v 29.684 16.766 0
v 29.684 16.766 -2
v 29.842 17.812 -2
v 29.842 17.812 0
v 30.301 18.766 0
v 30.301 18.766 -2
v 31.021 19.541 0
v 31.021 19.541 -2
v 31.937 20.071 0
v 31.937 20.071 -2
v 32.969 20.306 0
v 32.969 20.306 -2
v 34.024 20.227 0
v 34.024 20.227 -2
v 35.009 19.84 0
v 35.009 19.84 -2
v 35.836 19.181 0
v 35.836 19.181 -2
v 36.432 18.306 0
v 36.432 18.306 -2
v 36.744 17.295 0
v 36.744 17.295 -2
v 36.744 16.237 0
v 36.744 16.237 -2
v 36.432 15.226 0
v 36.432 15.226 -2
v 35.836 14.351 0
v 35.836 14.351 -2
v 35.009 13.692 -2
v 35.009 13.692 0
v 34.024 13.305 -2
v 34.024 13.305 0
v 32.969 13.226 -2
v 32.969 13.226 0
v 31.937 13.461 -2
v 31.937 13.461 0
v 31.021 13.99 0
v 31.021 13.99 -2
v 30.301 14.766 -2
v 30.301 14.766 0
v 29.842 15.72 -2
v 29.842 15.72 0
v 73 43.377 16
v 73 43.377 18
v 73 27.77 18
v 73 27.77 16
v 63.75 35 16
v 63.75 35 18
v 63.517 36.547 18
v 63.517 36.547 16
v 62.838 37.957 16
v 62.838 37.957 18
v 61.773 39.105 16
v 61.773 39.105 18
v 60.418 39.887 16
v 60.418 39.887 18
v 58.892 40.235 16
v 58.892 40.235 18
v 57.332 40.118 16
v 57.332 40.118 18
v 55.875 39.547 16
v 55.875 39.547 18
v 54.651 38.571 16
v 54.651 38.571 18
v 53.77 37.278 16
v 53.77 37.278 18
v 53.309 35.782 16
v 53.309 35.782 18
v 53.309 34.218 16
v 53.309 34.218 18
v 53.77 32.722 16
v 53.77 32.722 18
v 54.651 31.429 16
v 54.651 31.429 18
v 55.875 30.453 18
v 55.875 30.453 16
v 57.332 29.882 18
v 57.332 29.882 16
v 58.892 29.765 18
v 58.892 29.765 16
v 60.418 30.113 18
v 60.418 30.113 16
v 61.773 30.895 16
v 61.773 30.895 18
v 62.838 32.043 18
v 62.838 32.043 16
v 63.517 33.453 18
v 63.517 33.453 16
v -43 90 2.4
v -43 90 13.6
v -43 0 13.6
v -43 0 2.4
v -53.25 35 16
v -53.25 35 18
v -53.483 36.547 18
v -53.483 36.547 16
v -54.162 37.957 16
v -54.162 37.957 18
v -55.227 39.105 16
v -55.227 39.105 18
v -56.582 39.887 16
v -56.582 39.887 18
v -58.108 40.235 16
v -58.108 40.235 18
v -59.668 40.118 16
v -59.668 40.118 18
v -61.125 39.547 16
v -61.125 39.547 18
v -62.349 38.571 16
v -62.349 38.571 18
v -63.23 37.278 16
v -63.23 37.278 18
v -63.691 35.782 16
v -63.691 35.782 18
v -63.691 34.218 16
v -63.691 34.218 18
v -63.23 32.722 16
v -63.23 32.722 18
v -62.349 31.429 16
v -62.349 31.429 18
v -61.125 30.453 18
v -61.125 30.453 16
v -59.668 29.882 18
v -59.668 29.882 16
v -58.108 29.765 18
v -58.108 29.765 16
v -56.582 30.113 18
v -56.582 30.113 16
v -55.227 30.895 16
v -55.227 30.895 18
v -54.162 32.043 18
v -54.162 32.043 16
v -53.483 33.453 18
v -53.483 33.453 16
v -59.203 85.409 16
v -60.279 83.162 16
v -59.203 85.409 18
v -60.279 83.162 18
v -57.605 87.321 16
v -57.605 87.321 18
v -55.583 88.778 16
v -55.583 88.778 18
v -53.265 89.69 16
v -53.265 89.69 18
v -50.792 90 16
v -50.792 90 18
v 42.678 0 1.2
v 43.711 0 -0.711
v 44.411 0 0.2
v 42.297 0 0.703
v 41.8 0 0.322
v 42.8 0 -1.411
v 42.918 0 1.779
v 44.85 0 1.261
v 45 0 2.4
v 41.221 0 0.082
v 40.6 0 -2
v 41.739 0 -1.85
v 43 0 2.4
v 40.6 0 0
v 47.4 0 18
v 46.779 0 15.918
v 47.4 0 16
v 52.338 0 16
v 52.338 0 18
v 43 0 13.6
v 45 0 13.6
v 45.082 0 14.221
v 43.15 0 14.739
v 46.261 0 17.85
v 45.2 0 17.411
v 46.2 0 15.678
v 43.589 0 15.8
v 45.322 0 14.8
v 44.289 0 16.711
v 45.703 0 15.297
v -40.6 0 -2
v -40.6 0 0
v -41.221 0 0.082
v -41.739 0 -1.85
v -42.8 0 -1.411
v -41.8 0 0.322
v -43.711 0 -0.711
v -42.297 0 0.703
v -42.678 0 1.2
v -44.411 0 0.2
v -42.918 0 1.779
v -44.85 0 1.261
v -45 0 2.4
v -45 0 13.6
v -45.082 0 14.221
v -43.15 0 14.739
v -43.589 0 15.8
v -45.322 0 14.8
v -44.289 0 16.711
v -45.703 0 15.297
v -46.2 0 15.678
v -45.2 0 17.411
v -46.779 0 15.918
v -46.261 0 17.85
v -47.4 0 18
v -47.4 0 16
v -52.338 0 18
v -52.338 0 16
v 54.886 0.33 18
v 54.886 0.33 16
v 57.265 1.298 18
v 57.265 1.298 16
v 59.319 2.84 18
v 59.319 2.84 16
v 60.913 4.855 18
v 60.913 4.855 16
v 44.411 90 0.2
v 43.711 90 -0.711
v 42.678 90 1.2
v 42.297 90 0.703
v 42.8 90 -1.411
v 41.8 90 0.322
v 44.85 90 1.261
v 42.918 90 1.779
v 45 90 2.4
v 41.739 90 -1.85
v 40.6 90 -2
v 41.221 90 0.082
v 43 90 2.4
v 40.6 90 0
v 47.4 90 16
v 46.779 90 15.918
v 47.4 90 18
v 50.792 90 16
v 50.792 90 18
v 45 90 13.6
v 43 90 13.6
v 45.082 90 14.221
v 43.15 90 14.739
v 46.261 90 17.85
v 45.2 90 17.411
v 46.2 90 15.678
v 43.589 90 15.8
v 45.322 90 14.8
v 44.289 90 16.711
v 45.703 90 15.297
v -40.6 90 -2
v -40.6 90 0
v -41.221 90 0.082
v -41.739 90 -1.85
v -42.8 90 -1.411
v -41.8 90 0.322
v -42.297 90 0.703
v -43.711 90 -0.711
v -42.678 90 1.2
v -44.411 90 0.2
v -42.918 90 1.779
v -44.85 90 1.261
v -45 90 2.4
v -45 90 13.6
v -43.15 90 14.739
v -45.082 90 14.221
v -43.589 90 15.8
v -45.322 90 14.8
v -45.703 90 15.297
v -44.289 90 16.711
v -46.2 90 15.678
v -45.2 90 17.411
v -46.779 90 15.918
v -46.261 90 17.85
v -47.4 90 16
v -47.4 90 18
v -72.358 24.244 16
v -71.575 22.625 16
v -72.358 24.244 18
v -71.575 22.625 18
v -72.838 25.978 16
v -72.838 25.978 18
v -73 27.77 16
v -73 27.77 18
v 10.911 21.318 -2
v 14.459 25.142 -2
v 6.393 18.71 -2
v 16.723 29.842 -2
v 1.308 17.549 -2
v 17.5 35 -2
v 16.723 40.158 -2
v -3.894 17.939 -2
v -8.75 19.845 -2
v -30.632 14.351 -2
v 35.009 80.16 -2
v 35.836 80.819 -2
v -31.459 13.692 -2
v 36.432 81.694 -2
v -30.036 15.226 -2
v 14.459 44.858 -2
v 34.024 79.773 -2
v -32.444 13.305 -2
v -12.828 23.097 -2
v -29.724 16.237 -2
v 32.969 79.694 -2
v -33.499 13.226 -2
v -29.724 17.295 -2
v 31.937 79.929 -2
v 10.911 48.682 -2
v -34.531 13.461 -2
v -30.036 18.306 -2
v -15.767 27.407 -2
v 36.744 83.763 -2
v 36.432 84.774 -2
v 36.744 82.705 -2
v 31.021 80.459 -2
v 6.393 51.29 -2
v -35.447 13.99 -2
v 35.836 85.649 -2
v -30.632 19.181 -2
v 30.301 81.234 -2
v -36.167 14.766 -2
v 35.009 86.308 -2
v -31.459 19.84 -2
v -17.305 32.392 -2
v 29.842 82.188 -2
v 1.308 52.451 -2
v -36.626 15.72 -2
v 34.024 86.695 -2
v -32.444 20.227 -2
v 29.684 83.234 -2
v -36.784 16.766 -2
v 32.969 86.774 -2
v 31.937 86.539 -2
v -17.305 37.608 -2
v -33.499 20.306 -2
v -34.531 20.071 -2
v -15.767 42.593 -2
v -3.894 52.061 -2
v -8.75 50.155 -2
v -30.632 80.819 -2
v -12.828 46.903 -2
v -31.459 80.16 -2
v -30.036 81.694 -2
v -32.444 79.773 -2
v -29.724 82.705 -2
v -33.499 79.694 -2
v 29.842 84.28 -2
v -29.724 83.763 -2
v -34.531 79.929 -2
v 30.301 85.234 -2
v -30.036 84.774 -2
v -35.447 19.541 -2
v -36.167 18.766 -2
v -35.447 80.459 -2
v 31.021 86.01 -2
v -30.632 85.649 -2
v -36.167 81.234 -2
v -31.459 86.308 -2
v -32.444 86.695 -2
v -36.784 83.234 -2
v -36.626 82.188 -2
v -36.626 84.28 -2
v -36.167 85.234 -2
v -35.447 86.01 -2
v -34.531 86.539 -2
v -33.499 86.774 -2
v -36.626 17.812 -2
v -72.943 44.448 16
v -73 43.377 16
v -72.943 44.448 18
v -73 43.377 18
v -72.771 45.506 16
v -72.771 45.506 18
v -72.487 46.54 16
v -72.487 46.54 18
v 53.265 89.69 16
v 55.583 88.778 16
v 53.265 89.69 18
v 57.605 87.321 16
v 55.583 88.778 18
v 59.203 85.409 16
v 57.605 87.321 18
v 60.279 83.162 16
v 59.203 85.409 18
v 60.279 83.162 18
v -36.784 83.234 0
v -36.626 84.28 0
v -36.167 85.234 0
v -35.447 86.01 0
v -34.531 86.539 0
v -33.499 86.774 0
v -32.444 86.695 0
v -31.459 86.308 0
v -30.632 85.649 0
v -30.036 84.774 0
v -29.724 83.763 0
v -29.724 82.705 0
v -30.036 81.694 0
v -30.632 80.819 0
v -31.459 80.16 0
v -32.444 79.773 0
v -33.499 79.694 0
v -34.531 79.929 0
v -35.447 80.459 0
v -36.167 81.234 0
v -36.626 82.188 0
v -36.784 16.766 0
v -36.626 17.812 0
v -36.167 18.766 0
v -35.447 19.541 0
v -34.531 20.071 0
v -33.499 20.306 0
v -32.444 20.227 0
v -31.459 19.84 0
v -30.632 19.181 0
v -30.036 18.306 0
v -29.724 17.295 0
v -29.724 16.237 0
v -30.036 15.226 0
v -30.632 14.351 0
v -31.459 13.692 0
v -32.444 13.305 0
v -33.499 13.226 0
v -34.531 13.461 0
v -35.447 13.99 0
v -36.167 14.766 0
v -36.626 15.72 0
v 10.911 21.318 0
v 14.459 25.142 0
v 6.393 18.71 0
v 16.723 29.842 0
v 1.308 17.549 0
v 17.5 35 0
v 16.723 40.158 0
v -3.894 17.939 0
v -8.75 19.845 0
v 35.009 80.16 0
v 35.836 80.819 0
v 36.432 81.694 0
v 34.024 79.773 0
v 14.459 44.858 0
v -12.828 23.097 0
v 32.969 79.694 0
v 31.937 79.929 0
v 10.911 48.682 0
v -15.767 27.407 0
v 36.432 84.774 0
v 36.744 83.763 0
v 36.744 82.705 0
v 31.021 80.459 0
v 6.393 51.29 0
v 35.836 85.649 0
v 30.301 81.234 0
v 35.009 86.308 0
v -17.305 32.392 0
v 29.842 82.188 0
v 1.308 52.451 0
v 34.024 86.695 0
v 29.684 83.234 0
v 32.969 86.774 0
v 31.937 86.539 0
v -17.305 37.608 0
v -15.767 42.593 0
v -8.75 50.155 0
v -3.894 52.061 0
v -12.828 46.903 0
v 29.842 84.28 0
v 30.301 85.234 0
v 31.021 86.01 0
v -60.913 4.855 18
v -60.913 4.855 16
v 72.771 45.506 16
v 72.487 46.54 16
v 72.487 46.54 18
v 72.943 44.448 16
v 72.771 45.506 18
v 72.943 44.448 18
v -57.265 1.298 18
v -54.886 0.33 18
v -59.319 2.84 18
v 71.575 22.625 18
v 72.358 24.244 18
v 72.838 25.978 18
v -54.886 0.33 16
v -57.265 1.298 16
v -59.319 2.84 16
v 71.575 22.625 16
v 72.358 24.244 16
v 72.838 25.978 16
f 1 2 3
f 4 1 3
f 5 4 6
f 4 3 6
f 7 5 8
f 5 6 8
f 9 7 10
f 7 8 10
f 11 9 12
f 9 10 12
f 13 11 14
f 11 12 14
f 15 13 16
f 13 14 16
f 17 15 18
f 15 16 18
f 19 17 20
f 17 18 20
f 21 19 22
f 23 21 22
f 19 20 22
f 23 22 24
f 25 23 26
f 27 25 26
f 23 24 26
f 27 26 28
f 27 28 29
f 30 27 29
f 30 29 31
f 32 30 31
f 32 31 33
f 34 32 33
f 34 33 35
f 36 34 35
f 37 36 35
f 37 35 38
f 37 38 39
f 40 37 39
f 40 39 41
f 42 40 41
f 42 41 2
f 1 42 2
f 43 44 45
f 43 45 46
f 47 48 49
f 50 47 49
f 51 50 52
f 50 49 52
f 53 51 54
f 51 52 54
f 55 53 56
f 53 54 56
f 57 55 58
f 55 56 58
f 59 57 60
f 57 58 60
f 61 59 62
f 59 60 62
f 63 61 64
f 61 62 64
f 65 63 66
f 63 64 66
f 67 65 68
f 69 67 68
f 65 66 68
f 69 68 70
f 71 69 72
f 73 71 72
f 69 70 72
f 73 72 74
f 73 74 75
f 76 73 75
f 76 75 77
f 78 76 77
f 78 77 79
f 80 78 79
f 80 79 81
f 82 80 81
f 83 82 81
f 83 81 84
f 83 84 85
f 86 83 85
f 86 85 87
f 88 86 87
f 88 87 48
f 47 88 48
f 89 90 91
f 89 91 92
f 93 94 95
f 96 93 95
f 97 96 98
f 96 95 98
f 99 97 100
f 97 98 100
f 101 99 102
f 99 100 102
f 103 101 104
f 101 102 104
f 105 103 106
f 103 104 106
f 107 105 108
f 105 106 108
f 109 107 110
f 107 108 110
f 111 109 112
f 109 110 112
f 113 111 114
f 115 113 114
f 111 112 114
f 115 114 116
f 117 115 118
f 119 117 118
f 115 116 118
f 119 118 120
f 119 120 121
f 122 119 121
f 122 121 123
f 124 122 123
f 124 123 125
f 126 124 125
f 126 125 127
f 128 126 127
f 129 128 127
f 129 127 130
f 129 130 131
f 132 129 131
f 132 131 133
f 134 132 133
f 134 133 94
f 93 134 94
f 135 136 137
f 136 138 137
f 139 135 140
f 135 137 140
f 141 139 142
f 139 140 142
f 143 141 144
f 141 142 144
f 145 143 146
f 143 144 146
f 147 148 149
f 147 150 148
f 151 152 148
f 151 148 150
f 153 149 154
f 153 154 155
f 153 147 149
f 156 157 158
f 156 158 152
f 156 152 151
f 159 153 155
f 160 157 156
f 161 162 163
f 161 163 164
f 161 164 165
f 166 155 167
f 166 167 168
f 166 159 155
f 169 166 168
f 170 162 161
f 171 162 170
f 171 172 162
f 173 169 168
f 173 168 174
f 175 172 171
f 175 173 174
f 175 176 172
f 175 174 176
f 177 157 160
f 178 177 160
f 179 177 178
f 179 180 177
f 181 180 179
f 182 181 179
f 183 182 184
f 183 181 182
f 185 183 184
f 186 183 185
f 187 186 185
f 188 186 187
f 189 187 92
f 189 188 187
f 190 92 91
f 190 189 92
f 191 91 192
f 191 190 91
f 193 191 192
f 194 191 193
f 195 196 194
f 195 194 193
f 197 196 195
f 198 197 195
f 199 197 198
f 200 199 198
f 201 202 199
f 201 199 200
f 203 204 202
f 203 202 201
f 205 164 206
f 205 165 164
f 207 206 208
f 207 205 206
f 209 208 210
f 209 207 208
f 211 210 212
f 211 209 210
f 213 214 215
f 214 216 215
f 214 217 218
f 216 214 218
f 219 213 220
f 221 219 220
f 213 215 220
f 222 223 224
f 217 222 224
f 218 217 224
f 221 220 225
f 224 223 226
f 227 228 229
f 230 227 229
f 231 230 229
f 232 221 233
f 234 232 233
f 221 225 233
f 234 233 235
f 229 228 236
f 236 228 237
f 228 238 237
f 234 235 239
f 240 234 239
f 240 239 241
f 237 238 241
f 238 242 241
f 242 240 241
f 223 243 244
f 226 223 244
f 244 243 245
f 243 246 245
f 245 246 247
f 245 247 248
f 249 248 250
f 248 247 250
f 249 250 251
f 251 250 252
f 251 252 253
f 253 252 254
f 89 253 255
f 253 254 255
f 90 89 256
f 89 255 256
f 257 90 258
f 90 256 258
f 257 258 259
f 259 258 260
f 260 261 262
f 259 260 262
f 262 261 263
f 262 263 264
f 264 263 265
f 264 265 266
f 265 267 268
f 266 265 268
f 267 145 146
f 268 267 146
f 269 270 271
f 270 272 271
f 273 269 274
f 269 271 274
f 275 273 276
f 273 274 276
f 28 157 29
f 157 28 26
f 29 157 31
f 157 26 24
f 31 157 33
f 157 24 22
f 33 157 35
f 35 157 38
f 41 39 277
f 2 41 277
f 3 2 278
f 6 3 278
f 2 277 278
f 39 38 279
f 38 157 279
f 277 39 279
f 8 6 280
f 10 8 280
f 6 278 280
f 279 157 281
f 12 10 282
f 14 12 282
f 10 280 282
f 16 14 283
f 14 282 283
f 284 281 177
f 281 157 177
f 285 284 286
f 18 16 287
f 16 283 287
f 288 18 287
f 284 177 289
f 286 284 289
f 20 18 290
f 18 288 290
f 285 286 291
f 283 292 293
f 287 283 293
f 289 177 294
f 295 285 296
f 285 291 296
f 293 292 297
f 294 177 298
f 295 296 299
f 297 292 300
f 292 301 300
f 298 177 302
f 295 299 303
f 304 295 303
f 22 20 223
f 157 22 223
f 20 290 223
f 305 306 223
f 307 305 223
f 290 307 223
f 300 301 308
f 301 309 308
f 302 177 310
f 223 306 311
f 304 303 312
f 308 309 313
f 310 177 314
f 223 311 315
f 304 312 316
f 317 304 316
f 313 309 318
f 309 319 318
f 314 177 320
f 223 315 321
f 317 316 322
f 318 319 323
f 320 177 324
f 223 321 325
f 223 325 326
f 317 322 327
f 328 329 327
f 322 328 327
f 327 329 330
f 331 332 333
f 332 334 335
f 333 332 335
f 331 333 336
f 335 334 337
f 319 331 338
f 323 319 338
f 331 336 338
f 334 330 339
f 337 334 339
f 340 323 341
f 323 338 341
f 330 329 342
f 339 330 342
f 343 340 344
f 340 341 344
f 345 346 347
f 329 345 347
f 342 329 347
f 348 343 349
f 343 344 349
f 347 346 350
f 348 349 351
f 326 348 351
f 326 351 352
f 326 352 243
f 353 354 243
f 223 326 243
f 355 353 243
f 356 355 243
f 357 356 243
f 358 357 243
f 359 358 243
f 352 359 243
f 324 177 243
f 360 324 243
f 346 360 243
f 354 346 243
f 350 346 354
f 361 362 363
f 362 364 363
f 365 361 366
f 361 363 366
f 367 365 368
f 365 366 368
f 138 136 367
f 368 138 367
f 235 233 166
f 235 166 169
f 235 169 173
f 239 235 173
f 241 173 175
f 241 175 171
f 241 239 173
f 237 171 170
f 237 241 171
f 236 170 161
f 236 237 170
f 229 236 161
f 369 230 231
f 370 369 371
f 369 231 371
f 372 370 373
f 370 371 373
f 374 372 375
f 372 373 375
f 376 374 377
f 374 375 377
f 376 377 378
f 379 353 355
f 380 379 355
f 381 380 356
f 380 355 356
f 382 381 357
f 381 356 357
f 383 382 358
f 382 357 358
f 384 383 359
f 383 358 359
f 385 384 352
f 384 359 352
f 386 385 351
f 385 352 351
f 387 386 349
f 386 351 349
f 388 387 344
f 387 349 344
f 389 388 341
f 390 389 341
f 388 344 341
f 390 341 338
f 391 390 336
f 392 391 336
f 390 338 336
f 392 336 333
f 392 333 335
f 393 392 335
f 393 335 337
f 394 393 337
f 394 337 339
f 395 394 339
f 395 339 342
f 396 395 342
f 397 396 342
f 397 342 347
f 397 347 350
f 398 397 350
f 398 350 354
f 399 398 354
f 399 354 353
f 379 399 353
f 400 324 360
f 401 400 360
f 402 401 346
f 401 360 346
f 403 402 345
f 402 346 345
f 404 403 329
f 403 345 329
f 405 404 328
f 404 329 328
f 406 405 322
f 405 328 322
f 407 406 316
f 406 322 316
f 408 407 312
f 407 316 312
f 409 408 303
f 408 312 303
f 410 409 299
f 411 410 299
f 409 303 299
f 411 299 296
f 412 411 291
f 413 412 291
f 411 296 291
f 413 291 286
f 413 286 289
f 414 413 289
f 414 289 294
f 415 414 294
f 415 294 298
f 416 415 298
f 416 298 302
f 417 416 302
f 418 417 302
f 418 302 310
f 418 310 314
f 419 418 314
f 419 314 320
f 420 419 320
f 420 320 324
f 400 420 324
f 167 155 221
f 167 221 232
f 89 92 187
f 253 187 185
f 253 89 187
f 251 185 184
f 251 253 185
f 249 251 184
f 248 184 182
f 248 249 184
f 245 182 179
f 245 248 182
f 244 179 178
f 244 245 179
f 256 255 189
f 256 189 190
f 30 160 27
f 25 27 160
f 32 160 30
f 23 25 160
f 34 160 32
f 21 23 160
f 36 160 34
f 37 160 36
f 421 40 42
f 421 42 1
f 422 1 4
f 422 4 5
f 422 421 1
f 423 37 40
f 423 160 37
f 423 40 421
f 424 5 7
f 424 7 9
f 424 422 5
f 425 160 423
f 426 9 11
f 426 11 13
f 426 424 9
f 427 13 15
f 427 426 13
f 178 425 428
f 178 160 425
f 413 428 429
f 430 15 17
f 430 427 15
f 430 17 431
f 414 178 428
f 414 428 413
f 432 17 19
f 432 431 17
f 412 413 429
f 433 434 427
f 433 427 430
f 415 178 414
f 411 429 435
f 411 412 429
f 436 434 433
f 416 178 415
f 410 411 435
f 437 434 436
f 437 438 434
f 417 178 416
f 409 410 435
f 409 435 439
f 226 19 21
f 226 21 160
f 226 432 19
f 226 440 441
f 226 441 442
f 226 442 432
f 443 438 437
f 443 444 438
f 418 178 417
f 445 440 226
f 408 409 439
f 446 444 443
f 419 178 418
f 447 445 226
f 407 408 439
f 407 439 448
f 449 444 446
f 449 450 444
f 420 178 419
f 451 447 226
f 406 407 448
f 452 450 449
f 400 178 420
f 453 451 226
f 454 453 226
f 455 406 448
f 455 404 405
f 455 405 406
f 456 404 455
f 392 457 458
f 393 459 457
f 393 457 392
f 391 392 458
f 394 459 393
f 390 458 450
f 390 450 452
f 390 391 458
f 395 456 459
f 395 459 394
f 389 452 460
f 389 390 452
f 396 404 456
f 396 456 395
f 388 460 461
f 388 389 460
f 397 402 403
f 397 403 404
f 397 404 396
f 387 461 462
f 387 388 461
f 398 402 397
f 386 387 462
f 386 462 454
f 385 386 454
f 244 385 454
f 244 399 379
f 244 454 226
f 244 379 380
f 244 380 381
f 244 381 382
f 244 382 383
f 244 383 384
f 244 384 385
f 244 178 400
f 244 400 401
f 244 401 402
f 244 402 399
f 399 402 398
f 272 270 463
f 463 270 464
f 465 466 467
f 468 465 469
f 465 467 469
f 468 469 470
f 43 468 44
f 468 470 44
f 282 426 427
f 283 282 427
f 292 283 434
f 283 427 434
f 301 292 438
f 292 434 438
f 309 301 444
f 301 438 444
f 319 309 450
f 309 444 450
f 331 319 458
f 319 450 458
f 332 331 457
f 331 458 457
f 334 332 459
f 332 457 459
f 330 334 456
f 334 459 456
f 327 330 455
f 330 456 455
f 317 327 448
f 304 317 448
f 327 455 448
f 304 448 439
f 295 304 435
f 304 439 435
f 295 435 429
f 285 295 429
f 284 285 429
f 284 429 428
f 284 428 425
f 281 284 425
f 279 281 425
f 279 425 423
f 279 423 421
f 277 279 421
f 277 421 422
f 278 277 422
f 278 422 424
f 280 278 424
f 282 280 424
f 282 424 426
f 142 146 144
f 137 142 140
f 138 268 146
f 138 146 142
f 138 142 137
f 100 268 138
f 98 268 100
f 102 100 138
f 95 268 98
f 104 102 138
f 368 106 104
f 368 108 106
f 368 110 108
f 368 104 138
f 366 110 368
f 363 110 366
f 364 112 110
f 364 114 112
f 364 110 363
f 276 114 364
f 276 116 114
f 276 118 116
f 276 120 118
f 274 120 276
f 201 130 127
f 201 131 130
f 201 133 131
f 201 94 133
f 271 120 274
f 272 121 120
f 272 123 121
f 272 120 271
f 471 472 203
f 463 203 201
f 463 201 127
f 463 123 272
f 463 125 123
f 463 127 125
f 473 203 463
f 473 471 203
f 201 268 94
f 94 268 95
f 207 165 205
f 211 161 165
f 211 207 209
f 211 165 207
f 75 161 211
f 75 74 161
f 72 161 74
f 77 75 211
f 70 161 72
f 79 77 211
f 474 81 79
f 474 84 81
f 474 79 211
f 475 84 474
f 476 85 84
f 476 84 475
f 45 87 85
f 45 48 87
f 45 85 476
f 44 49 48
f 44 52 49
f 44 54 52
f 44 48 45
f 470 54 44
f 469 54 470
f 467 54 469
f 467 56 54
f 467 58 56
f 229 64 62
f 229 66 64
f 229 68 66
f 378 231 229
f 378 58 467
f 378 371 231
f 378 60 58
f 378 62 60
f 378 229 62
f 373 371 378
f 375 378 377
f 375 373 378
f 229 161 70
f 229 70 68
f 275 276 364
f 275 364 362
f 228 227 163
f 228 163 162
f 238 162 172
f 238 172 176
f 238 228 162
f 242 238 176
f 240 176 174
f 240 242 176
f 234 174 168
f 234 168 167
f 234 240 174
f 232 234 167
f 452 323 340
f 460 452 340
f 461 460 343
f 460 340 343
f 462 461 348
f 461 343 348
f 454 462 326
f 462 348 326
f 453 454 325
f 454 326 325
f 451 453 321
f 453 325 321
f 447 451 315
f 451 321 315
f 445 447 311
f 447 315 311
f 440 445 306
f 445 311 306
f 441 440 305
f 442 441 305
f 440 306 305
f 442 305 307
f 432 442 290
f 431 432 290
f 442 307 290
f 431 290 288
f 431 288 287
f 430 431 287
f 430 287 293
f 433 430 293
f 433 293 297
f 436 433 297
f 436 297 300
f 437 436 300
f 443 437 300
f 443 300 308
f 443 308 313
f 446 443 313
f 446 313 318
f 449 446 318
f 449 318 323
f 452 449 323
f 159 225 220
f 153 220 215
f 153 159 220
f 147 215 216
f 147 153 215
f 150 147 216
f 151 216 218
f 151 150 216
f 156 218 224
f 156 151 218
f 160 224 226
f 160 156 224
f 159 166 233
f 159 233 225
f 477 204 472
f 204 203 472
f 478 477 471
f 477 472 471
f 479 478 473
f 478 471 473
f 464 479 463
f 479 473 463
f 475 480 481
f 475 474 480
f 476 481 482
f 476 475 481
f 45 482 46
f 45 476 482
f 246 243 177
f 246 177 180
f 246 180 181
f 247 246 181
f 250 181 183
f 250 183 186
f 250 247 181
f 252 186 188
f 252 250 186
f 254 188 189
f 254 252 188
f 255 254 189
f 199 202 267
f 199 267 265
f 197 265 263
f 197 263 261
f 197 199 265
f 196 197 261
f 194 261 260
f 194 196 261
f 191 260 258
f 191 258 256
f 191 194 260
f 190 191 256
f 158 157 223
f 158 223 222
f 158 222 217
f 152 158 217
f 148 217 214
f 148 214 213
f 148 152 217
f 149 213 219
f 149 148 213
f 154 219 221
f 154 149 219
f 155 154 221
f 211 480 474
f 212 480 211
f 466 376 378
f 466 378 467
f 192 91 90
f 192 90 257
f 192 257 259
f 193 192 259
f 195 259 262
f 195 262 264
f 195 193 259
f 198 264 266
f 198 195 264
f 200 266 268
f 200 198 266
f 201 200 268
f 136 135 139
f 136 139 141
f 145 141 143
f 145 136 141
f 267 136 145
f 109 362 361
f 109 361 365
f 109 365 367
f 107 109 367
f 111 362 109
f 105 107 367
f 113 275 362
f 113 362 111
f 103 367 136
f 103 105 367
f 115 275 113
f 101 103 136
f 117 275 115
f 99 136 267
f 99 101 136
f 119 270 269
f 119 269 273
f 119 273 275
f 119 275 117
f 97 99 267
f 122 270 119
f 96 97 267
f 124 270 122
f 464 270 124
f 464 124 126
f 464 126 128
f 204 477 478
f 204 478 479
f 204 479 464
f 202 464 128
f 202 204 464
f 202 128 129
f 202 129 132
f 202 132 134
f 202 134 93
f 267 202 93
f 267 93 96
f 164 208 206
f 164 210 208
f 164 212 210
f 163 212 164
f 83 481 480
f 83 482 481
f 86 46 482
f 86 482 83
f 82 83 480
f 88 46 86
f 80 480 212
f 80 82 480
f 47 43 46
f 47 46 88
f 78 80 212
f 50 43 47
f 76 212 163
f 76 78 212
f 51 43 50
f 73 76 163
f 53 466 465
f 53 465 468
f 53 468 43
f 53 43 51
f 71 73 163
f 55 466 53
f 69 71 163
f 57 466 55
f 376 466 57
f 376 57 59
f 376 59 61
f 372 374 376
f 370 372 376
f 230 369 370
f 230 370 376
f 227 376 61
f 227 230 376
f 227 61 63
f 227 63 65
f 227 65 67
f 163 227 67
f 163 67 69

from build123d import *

# Parameters (mm, degrees)
SM_START                           = -40.6
SM_BASE_FLANGE_1_OUTLINE_W         = 2
SM_BASE_FLANGE_1_OUTLINE_H         = 90
SM_BASE_FLANGE_1_DEPTH             = 81.2
SKETCH_6_R                         = 17.5
CUT_EXTRUDE_1_DEPTH                = 10
F_7_1_7_1_DIAMETER_HOLE1_D         = 7.1
SM_EDGE_FLANGE_1_DEPTH             = 90
SM_EDGE_FLANGE_1_BEND_DEPTH        = 90
SM_EDGE_FLANGE_2_STRIP_W           = 12.8
SM_EDGE_FLANGE_2_STRIP_H           = 2
SM_EDGE_FLANGE_2_STRIP_CUT_DEPTH   = 90
SM_EDGE_FLANGE_2_STRIP_2_W         = 12.8
SM_EDGE_FLANGE_2_STRIP_2_H         = 2
SM_EDGE_FLANGE_2_STRIP_CUT_2_DEPTH = 90
SM_EDGE_FLANGE_2_DEPTH             = 90
SM_EDGE_FLANGE_2_BEND_DEPTH        = 90
CUT_EXTRUDE1_DEPTH                 = 118.273185341
FILLET_2_R                         = 10
F_10_5_10_5_DIAMETER_HOLE1_D       = 10.5


# Read off the part's stored shape, not the designer's step: Базовая кромка1
# Sheet-metal steps are written as plain solids
with BuildPart() as part:
    # Базовая кромка1 outline → Базовая кромка1 (new body)
    with BuildSketch(Plane(origin=(0, 0, 0), x_dir=(0, 0, -1), z_dir=(1, 0, 0)).offset(SM_START)):
        with Locations((1, 45)):
            Rectangle(SM_BASE_FLANGE_1_OUTLINE_W, SM_BASE_FLANGE_1_OUTLINE_H)
    extrude(amount=SM_BASE_FLANGE_1_DEPTH)

    # Эскиз6 → Вырез-Вытянуть1 (cut)
    with BuildSketch(Plane.XY):
        with Locations((0, 35)):
            Circle(SKETCH_6_R)
    extrude(amount=-CUT_EXTRUDE_1_DEPTH, mode=Mode.SUBTRACT)

    # Ø7.1 (7.1) Diameter Hole1 (through all)
    with Locations(Plane.XY):
        with Locations((-33.234018716, 83.234018716), (33.234018716, 83.234018716), (33.234018716, 16.765981284), (-33.234018716, 16.765981284)):
            Hole(F_7_1_7_1_DIAMETER_HOLE1_D / 2)

    # Ребро-кромка1 section (across the edge) → Ребро-кромка1 (add)
    with BuildSketch(Plane(origin=(43, 0, 0), x_dir=(-1, 0, 0), z_dir=(0, 1, 0))):
        with BuildLine():
            Line((-2, 2.4), (-2, 18))
            Line((-2, 18), (0, 18))
            Line((0, 18), (0, 2.4))
            ThreePointArc((0, 2.4), (0.702943725, 0.702943725), (2.4, 0))
            Line((2.4, 0), (2.4, -2))
            ThreePointArc((2.4, -2), (-0.711269837, -0.711269837), (-2, 2.4))
        make_face()
    extrude(amount=SM_EDGE_FLANGE_1_DEPTH)

    # Ребро-кромка1 section 2 (across the edge) → Ребро-кромка1 bend (add)
    with BuildSketch(Plane(origin=(-43, 90, 0), x_dir=(1, 0, 0), z_dir=(0, -1, 0))):
        with BuildLine():
            Line((-2, 2.4), (-2, 18))
            Line((-2, 18), (0, 18))
            Line((0, 18), (0, 2.4))
            ThreePointArc((0, 2.4), (0.702943725, 0.702943725), (2.4, 0))
            Line((2.4, 0), (2.4, -2))
            ThreePointArc((2.4, -2), (-0.711269837, -0.711269837), (-2, 2.4))
        make_face()
    extrude(amount=SM_EDGE_FLANGE_1_BEND_DEPTH)

    # Ребро-кромка2 strip (across the edge) → Ребро-кромка2 strip cut (cut)
    with BuildSketch(Plane(origin=(45, 90, 18), x_dir=(0, 0, -1), z_dir=(0, -1, 0))):
        with Locations((-2, -1)):
            Rectangle(SM_EDGE_FLANGE_2_STRIP_W, SM_EDGE_FLANGE_2_STRIP_H)
    extrude(amount=SM_EDGE_FLANGE_2_STRIP_CUT_DEPTH, mode=Mode.SUBTRACT)

    # Ребро-кромка2 strip 2 (across the edge) → Ребро-кромка2 strip cut 2 (cut)
    with BuildSketch(Plane(origin=(-45, 0, 18), x_dir=(0, 0, -1), z_dir=(0, 1, 0))):
        with Locations((-2, -1)):
            Rectangle(SM_EDGE_FLANGE_2_STRIP_2_W, SM_EDGE_FLANGE_2_STRIP_2_H)
    extrude(amount=SM_EDGE_FLANGE_2_STRIP_CUT_2_DEPTH, mode=Mode.SUBTRACT)

    # Ребро-кромка2 section (across the edge) → Ребро-кромка2 (add)
    with BuildSketch(Plane(origin=(45, 90, 18), x_dir=(0, 0, -1), z_dir=(0, -1, 0))):
        with BuildLine():
            Line((0, 2.4), (0, 28))
            Line((0, 28), (2, 28))
            Line((2, 28), (2, 2.4))
            ThreePointArc((2, 2.4), (2.702943725, 0.702943725), (4.4, 0))
            Line((4.4, 0), (4.4, -2))
            ThreePointArc((4.4, -2), (1.288730163, -0.711269837), (0, 2.4))
        make_face()
    extrude(amount=SM_EDGE_FLANGE_2_DEPTH)

    # Ребро-кромка2 section 2 (across the edge) → Ребро-кромка2 bend (add)
    with BuildSketch(Plane(origin=(-45, 0, 18), x_dir=(0, 0, -1), z_dir=(0, 1, 0))):
        with BuildLine():
            Line((0, 2.4), (0, 28))
            Line((0, 28), (2, 28))
            Line((2, 28), (2, 2.4))
            ThreePointArc((2, 2.4), (2.702943725, 0.702943725), (4.4, 0))
            Line((4.4, 0), (4.4, -2))
            ThreePointArc((4.4, -2), (1.288730163, -0.711269837), (0, 2.4))
        make_face()
    extrude(amount=SM_EDGE_FLANGE_2_BEND_DEPTH)

    # Sketch4 → Cut-Extrude1 (cut, through all)
    with BuildSketch(Plane(origin=(0, 0, 16), x_dir=(-1, 0, 0), z_dir=(0, 0, -1))):
        Polygon((-73, 90), (-58, 90), (-73, 45), align=None)
        Polygon((-73, 25), (-58, 0), (-73, 0), align=None)
        Polygon((73, 0), (73, 25), (58, 0), align=None)
        Polygon((58, 90), (73, 45), (73, 90), align=None)
    extrude(amount=-CUT_EXTRUDE1_DEPTH, mode=Mode.SUBTRACT)

    # Скругление2
    fillet_2_edges = [part.edges().sort_by_distance(p)[0] for p in [
        (-58, 90, 17),
        (-73, 45, 17),
        (-58, 0, 17),
        (-73, 25, 17),
        (73, 25, 17),
        (58, 0, 17),
        (73, 45, 17),
        (58, 90, 17),
    ]]
    fillet(fillet_2_edges, radius=FILLET_2_R)

    # Ø10.5 (10.5) Diameter Hole1 (through all)
    with Locations(Plane(origin=(0, 0, -2), x_dir=(-1, 0, 0), z_dir=(0, 0, -1))):
        with Locations((-58.5, 35), (58.5, 35)):
            Hole(F_10_5_10_5_DIAMETER_HOLE1_D / 2)


solid = part.part
